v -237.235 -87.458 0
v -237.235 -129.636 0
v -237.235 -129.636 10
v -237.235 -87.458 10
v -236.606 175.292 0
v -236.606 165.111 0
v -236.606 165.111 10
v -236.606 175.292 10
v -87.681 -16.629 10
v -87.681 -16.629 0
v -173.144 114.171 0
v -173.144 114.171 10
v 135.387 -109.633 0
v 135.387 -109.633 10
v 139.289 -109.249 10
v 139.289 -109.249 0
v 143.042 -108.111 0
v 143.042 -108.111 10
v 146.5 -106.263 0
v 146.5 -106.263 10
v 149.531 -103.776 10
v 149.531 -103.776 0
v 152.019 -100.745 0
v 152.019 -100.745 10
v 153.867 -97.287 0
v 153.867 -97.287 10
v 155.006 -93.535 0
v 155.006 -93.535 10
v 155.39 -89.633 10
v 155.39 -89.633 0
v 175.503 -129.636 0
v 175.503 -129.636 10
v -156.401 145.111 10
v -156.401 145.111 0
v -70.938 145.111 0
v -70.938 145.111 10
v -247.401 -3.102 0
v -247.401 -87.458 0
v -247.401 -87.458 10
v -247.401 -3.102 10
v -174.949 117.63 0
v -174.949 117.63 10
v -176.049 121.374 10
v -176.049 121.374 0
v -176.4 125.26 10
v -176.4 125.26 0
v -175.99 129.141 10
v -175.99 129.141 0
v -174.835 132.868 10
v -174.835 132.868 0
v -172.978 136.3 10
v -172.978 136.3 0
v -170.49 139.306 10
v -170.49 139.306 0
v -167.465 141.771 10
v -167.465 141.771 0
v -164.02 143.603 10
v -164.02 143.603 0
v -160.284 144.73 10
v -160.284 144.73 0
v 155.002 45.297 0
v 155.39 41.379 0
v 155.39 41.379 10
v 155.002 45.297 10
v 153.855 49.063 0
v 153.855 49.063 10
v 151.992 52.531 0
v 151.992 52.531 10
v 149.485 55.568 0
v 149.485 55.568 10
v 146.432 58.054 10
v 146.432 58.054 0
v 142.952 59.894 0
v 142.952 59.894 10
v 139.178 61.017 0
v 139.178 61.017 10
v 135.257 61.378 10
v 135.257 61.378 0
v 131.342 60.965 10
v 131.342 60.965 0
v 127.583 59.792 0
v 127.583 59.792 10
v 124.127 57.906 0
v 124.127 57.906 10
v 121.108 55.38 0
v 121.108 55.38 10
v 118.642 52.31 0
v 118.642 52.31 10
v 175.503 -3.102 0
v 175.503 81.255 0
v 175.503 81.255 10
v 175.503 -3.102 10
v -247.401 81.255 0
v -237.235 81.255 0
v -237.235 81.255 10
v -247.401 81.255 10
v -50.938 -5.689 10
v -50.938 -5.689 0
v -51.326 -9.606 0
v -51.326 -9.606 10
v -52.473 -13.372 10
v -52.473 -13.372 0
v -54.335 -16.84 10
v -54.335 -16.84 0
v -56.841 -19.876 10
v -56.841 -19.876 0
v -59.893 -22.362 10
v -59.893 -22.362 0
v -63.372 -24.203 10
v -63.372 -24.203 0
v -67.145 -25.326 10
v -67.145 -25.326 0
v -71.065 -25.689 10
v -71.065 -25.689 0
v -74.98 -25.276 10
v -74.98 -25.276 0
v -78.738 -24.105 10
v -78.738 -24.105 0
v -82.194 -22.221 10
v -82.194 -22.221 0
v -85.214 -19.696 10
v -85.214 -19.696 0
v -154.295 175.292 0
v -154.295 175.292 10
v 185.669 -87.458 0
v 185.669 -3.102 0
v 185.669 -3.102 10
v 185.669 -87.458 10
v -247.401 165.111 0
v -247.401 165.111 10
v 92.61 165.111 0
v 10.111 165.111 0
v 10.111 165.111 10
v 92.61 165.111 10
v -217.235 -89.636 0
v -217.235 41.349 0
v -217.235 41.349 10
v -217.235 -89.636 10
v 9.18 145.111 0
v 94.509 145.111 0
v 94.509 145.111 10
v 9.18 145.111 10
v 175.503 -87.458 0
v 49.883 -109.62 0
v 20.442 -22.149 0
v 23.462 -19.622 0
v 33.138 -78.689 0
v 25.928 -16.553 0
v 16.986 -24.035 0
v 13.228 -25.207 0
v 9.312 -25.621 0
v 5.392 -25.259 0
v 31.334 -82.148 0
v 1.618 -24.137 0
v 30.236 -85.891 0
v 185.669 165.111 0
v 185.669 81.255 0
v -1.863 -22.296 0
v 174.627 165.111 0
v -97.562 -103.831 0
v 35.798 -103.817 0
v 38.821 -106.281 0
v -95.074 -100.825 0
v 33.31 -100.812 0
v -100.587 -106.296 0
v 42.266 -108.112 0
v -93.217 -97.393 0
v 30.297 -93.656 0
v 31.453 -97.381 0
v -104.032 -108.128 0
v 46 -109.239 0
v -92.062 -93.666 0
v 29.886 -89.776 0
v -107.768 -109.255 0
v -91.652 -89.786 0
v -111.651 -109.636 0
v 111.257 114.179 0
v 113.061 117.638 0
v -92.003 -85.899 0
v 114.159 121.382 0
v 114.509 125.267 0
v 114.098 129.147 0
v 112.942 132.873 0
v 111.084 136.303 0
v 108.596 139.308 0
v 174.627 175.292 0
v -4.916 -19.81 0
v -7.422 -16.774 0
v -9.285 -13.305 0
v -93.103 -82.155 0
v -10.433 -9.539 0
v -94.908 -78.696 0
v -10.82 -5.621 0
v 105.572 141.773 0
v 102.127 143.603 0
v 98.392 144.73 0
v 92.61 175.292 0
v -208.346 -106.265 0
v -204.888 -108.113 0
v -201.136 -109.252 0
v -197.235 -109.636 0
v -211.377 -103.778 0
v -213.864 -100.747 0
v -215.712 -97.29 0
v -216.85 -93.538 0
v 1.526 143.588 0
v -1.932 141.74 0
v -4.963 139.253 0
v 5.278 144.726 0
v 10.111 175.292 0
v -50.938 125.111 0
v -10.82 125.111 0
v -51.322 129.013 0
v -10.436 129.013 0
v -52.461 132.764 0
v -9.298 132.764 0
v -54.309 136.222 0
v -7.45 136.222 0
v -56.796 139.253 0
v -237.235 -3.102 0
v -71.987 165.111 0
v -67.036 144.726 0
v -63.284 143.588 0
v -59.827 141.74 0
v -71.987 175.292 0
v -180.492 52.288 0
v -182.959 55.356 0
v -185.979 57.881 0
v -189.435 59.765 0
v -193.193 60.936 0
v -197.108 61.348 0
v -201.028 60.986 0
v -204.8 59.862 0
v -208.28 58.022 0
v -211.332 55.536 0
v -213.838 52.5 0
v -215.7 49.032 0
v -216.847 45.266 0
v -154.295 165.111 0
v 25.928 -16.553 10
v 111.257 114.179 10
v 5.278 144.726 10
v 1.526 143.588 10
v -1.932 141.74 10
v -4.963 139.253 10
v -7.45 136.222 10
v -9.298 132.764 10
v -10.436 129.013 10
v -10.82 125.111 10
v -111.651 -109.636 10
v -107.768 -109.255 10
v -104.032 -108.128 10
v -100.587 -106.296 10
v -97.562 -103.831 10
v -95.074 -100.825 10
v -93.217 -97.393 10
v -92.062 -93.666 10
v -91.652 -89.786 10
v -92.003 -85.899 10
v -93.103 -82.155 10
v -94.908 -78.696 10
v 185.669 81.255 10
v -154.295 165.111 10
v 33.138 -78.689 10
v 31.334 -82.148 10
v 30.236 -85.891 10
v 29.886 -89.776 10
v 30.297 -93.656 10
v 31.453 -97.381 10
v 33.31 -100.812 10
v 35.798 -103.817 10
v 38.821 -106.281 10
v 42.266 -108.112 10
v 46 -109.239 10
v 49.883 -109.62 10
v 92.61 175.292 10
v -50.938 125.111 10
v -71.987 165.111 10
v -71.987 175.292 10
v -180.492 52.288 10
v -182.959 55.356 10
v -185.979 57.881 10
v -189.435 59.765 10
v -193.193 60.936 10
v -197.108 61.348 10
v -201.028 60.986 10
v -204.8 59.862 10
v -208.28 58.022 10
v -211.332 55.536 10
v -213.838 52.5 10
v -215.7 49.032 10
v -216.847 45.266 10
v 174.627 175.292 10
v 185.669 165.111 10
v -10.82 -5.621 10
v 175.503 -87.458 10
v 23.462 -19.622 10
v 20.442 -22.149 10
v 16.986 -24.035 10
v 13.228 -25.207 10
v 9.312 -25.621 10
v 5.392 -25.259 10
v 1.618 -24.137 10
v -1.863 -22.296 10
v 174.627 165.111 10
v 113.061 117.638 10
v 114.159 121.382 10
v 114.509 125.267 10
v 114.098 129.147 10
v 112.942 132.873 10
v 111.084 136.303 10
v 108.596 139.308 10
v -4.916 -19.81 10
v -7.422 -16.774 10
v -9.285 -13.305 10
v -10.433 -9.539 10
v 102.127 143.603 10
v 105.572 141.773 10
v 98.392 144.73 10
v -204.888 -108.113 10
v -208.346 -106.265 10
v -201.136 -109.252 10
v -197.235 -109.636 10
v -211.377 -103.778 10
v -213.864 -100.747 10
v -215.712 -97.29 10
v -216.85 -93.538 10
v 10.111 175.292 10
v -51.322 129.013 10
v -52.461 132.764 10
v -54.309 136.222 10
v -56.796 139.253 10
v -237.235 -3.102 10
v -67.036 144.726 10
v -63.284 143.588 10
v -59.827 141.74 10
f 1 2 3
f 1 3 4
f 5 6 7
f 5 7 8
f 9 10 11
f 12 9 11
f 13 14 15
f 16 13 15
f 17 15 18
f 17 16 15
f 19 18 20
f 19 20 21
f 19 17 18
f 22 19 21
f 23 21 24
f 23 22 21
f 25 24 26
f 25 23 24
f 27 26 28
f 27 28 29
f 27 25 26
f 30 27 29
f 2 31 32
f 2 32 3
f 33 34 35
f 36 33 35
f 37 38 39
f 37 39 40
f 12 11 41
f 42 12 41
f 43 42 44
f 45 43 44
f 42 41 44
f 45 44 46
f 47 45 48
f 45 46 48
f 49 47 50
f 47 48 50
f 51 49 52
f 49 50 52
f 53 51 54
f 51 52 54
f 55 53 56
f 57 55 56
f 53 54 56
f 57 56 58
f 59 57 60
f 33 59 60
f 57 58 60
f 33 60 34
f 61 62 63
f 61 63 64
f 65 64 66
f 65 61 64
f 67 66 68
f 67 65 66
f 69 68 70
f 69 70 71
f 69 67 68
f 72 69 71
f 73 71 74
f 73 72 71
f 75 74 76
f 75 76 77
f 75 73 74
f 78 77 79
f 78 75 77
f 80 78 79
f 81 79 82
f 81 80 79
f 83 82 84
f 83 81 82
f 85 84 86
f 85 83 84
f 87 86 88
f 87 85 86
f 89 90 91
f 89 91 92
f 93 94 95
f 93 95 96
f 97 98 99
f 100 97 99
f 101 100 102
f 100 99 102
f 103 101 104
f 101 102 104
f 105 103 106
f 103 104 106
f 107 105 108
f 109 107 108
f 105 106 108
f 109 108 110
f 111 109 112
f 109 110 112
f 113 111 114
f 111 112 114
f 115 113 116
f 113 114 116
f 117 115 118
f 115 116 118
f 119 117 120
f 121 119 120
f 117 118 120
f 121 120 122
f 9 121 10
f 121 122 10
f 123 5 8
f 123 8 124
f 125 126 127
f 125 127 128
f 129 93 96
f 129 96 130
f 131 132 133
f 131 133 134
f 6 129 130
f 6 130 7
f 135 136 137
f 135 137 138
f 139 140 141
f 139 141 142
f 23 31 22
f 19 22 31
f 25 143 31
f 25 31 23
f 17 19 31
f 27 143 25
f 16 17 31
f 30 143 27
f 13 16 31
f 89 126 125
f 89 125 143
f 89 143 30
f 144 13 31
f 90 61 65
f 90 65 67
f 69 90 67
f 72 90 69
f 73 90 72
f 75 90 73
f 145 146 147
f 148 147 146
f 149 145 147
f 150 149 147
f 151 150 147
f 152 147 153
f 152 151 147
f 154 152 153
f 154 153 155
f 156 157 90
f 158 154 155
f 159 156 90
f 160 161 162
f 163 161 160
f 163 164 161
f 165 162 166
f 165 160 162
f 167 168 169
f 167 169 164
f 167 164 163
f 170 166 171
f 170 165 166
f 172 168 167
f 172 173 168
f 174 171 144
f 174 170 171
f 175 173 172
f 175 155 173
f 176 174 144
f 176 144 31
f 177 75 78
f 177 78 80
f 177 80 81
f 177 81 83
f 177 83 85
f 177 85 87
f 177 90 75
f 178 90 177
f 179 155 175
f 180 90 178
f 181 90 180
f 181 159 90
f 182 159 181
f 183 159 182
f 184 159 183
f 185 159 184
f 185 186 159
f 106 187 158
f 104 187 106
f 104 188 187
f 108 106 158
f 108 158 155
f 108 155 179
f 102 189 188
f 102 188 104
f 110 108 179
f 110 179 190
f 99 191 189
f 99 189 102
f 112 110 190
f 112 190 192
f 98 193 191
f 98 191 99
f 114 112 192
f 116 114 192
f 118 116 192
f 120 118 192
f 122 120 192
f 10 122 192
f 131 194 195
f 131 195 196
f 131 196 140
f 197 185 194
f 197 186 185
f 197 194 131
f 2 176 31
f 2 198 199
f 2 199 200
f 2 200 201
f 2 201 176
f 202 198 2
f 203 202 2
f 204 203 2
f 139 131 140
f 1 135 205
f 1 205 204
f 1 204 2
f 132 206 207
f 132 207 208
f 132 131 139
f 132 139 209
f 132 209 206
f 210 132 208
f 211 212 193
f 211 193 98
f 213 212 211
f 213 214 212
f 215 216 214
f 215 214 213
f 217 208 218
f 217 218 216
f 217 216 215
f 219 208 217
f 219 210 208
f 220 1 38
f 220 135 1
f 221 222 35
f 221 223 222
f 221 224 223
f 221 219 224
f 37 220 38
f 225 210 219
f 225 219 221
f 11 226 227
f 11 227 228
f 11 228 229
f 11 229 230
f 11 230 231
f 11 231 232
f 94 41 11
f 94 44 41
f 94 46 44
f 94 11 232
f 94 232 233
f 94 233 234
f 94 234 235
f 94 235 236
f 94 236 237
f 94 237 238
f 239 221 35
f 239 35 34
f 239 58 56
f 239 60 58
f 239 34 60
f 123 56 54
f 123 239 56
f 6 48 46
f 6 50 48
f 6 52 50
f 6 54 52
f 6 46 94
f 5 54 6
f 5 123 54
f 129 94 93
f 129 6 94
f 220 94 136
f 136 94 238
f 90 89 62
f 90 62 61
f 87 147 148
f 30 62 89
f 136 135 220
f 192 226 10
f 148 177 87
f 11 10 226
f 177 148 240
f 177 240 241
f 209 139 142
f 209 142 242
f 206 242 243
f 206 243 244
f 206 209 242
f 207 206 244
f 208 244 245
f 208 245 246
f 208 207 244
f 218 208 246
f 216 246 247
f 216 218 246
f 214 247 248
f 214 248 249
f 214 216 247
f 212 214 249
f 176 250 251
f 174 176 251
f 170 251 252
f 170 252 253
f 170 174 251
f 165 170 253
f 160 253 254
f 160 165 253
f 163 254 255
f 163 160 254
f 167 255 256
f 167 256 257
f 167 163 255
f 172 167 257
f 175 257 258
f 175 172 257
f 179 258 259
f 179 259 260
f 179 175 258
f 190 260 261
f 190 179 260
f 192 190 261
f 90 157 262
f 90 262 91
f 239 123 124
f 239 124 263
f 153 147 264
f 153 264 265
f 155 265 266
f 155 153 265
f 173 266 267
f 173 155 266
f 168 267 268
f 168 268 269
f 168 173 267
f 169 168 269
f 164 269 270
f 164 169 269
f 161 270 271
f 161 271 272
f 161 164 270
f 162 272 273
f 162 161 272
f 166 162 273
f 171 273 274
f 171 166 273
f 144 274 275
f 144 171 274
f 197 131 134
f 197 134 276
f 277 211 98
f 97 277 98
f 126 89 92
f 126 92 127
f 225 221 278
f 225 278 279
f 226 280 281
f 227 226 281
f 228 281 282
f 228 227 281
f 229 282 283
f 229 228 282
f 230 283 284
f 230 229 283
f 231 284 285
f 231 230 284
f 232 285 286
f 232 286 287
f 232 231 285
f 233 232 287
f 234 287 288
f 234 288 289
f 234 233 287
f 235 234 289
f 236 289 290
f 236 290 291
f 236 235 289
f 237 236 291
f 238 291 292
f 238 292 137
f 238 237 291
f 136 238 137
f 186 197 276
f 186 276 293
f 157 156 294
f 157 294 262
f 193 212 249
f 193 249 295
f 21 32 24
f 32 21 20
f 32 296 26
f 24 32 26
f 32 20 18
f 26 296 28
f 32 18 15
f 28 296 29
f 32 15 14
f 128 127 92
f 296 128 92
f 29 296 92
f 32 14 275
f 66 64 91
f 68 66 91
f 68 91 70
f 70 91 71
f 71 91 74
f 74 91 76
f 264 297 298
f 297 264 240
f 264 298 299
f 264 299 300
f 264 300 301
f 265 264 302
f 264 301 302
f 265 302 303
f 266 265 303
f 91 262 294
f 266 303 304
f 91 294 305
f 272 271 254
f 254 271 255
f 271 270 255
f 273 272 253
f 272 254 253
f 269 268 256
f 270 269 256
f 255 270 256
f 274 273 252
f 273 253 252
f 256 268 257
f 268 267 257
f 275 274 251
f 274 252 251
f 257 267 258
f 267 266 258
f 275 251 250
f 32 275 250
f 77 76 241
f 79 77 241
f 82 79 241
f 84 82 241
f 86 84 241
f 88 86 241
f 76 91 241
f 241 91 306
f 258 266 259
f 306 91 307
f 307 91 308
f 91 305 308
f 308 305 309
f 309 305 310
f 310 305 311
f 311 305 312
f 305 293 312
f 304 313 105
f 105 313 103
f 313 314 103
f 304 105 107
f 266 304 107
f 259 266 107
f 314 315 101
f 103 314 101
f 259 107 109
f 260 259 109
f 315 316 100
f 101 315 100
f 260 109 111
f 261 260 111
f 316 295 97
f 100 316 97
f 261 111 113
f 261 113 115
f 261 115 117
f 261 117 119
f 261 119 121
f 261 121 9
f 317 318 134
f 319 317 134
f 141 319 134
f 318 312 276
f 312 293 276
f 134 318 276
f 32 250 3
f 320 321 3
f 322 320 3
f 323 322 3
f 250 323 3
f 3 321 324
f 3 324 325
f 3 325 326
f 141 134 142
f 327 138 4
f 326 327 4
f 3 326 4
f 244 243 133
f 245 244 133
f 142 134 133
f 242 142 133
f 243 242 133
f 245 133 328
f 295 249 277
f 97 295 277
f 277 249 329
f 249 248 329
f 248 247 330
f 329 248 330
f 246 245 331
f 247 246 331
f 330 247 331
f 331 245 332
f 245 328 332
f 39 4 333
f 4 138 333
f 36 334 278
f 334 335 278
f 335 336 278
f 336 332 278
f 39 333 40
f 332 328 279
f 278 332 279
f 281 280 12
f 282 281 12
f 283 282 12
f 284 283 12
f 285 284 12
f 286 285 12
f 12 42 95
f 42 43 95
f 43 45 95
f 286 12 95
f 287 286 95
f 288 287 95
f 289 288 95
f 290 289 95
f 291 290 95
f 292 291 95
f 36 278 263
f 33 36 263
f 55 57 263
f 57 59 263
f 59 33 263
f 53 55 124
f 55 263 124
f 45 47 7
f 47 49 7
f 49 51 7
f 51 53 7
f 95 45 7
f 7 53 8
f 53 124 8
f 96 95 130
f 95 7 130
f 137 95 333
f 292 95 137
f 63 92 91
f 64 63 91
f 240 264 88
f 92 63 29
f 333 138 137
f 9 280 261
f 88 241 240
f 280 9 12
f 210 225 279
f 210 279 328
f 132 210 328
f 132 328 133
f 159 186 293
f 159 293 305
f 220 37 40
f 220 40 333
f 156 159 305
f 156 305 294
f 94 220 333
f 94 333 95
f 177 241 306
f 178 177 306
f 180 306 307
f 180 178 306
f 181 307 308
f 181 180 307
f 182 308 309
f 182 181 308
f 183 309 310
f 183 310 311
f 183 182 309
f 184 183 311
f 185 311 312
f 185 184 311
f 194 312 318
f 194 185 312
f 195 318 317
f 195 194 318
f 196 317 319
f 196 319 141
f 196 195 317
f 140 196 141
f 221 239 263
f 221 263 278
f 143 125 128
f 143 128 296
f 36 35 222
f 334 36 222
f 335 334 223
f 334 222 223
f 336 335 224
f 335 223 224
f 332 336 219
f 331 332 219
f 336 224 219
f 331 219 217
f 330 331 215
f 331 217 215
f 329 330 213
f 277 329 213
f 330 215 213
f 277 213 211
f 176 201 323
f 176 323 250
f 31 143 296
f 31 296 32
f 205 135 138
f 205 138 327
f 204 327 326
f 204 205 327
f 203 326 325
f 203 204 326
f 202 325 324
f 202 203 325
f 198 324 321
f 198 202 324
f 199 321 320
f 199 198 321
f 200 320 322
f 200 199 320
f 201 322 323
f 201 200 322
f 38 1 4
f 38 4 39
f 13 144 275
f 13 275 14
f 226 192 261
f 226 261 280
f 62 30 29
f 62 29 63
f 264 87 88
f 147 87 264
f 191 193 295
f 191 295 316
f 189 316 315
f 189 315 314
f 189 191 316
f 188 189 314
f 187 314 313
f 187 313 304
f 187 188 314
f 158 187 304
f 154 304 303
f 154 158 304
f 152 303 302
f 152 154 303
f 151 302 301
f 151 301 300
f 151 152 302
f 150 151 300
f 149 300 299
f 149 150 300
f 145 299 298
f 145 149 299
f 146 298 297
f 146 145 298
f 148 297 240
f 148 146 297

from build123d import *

# Parameters (mm, degrees)
BOSS_EXTRUDE1_DEPTH = 10


with BuildPart() as part:
    # Sketch1 → Boss-Extrude1 (new body)
    with BuildSketch(Plane.XY):
        Polygon((-237.234601608, -129.63585579), (-237.234601608, -87.457773568), (-247.40109201, -87.457773568), (-247.40109201, -3.101609123), (-237.234601608, -3.101609123), (-237.234601608, 81.254555321), (-247.40109201, 81.254555321), (-247.40109201, 165.110720504), (-236.605829759, 165.110720504), (-236.605829759, 175.291552649), (-154.294832327, 175.291552649), (-154.294832327, 165.110720504), (-71.987006932, 165.110720504), (-71.987006932, 175.291552649), (10.110681918, 175.291552649), (10.110681918, 165.110720504), (92.609794057, 165.110720504), (92.609794057, 175.291552649), (174.626730953, 175.291552649), (174.626730953, 165.110720504), (185.669445552, 165.110720504), (185.669445552, 81.254555321), (175.502955151, 81.254555321), (175.502955151, -3.101609123), (185.669445552, -3.101609123), (185.669445552, -87.457773568), (175.502955151, -87.457773568), (175.502955151, -129.63585579), align=None)
        with BuildLine():
            Line((-50.938162507, 125.110720504), (-50.938162507, -5.688963776))
            ThreePointArc((-50.938162507, -5.688963776), (-65.231084294, -24.857408112), (-87.681088334, -16.62854488))
            Line((-87.681088334, -16.62854488), (-173.143675307, 114.1711394))
            ThreePointArc((-173.143675307, 114.1711394), (-173.99040016, 134.629343774), (-156.400749479, 145.110720504))
            Line((-156.400749479, 145.110720504), (-70.938162507, 145.110720504))
            ThreePointArc((-70.938162507, 145.110720504), (-56.796026883, 139.252856128), (-50.938162507, 125.110720504))
        make_face(mode=Mode.SUBTRACT)
        with BuildLine():
            Line((-217.234601608, 41.348661081), (-217.234601608, -89.63585579))
            ThreePointArc((-217.234601608, -89.63585579), (-211.376737232, -103.777991414), (-197.234601608, -109.63585579))
            Line((-197.234601608, -109.63585579), (-111.651247744, -109.63585579))
            ThreePointArc((-111.651247744, -109.63585579), (-94.061597063, -99.15447906), (-94.908321917, -78.696274685))
            Line((-94.908321917, -78.696274685), (-180.491675781, 52.288242186))
            ThreePointArc((-180.491675781, 52.288242186), (-202.941679822, 60.517105417), (-217.234601608, 41.348661081))
        make_face(mode=Mode.SUBTRACT)
        with BuildLine():
            Line((-10.820423043, 125.110720504), (-10.820423043, -5.621130667))
            ThreePointArc((-10.820423043, -5.621130667), (3.47704632, -24.79092838), (25.92769139, -16.552766545))
            Line((25.92769139, -16.552766545), (111.257475845, 114.179084627))
            ThreePointArc((111.257475845, 114.179084627), (112.096753452, 134.633516377), (94.509361412, 145.110720504))
            Line((94.509361412, 145.110720504), (9.179576957, 145.110720504))
            ThreePointArc((9.179576957, 145.110720504), (-4.962558666, 139.252856128), (-10.820423043, 125.110720504))
        make_face(mode=Mode.SUBTRACT)
        with BuildLine():
            Line((118.641820815, 52.310380527), (33.137535964, -78.688818793))
            ThreePointArc((33.137535964, -78.688818793), (32.297563362, -99.141966865), (49.882730912, -109.620454457))
            Line((49.882730912, -109.620454457), (135.387015764, -109.632935879))
            ThreePointArc((135.387015764, -109.632935879), (149.53103864, -103.776103872), (155.389935248, -89.632936092))
            Line((155.389935248, -89.632936092), (155.389935248, 41.37874465))
            ThreePointArc((155.389935248, 41.37874465), (141.092465886, 60.548542362), (118.641820815, 52.310380527))
        make_face(mode=Mode.SUBTRACT)
    extrude(amount=BOSS_EXTRUDE1_DEPTH)


solid = part.part
